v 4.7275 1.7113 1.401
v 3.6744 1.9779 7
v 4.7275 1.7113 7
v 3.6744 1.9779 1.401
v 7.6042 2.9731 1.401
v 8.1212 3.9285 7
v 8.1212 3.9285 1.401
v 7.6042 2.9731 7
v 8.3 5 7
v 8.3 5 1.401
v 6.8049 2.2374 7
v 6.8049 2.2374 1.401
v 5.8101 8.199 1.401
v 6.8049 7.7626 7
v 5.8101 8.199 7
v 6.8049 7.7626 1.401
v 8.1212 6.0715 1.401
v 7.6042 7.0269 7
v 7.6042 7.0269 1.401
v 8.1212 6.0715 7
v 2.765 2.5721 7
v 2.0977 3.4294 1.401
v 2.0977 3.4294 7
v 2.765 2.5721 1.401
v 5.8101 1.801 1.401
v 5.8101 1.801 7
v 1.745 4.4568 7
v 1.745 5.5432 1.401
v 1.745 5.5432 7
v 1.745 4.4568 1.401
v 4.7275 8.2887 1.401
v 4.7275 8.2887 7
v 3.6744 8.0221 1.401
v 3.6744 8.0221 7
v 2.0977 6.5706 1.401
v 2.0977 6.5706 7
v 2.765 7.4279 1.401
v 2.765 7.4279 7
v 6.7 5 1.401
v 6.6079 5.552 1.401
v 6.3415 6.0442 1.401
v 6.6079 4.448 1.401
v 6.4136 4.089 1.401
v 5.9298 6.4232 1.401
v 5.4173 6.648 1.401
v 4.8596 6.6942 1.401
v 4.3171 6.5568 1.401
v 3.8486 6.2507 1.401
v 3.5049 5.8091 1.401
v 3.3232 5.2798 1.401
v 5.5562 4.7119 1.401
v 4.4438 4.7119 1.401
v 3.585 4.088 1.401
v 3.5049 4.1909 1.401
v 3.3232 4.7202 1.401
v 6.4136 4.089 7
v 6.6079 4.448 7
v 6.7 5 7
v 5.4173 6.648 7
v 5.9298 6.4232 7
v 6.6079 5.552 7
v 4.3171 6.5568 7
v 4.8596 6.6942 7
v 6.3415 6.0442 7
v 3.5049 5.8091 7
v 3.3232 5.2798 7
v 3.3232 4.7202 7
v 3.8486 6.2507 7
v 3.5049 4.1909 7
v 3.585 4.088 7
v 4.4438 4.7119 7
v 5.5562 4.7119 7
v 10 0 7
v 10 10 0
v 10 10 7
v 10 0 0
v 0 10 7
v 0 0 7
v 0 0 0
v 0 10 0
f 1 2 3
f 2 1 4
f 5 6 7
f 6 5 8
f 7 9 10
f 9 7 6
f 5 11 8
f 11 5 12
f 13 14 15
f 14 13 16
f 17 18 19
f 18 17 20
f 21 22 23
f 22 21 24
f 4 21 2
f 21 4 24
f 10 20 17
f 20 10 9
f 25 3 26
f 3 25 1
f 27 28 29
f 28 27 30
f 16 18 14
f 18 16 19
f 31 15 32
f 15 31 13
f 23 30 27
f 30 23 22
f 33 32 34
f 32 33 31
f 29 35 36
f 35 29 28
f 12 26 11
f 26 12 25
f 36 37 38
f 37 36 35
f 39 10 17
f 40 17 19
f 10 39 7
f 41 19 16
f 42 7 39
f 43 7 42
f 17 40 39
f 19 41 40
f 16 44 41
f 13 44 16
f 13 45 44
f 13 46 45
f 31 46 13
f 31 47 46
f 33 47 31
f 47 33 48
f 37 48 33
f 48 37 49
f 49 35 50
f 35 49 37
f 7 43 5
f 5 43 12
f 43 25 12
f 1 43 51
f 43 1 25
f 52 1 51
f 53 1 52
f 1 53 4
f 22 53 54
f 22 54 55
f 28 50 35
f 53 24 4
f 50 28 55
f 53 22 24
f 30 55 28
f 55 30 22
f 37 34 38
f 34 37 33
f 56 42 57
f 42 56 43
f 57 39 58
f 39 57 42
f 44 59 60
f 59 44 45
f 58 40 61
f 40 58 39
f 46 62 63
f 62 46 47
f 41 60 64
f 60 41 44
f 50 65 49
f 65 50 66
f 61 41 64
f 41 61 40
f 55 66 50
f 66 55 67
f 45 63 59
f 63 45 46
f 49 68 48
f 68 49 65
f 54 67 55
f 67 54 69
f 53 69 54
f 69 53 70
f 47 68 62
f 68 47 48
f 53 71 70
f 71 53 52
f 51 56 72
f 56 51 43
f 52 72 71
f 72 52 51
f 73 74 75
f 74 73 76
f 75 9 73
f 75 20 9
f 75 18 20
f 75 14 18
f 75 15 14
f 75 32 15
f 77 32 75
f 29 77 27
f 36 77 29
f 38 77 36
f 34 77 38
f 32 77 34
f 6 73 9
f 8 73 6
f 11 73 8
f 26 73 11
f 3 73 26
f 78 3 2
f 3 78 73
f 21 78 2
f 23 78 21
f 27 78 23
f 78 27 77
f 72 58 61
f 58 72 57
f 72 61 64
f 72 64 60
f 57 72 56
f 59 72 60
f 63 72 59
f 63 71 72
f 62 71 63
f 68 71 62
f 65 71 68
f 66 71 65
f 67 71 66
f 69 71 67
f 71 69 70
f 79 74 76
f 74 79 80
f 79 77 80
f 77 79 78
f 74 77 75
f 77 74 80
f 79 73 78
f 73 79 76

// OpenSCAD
// file: constants.scad
connectors_notched_circle_thickness = 2;
connectors_notched_circle_notch_diameter = 3;
// file: ../../utilities/cylinders.scad
// Calculates the $fn which should be used for a cylinder of a specific size.
function cylinder_sides(
  // The diameter of the cylinder.
  diameter
) = ceil(
  max(
    min(
      360 / $fa,
      diameter * PI / $fs
    ),
    8
  )
);
// file: ../../settings.scad
// When true, lower resolution primitives will be used.
draft = false;

$fs = draft ? 2 : 1;
$fa = draft ? 12 : 6;

// The amount of space left between parts which must fit together tightly.
tight_tolerance = 0.6;

// The amount of space left between parts which must fit together loosely.
loose_tolerance = 1;
// main file
include <../../settings.scad>;
use <../../utilities/cylinders.scad>;
include <constants.scad>;

// Renders the female counterpart of a circular connector with an orienting
// notch.  Place on the surface oriented so that Z- is the surface normal.
module connectors_notched_circle_female(
    // The outer diameter of the compatible male circle.
    diameter,
    // The length of the male compatible circle.
    length
) {
  union() {
    difference() {
      cylinder(
        d = diameter + tight_tolerance,
        h = length + tight_tolerance,
        $fn = cylinder_sides(diameter)
      );
      cylinder(
        d = diameter - connectors_notched_circle_thickness - tight_tolerance,
        h = length + tight_tolerance,
        $fn = cylinder_sides(diameter)
      );
    };
    intersection() {
      translate([
        0,
        diameter / 2 - connectors_notched_circle_thickness / 2,
        0
      ]) {
        cylinder(
          d = connectors_notched_circle_notch_diameter + tight_tolerance,
          h = length + tight_tolerance,
          $fn = cylinder_sides(connectors_notched_circle_notch_diameter)
        );
      };
      cylinder(
        d = diameter + tight_tolerance,
        h = length + tight_tolerance,
        $fn = cylinder_sides(diameter)
      );
    };
  };
};

difference() {
  cube([10, 10, 7]);

  translate([5, 5, 7.001]) {
    rotate([180, 0, 0]) {
      connectors_notched_circle_female(6, 5);
    }
  };
};
